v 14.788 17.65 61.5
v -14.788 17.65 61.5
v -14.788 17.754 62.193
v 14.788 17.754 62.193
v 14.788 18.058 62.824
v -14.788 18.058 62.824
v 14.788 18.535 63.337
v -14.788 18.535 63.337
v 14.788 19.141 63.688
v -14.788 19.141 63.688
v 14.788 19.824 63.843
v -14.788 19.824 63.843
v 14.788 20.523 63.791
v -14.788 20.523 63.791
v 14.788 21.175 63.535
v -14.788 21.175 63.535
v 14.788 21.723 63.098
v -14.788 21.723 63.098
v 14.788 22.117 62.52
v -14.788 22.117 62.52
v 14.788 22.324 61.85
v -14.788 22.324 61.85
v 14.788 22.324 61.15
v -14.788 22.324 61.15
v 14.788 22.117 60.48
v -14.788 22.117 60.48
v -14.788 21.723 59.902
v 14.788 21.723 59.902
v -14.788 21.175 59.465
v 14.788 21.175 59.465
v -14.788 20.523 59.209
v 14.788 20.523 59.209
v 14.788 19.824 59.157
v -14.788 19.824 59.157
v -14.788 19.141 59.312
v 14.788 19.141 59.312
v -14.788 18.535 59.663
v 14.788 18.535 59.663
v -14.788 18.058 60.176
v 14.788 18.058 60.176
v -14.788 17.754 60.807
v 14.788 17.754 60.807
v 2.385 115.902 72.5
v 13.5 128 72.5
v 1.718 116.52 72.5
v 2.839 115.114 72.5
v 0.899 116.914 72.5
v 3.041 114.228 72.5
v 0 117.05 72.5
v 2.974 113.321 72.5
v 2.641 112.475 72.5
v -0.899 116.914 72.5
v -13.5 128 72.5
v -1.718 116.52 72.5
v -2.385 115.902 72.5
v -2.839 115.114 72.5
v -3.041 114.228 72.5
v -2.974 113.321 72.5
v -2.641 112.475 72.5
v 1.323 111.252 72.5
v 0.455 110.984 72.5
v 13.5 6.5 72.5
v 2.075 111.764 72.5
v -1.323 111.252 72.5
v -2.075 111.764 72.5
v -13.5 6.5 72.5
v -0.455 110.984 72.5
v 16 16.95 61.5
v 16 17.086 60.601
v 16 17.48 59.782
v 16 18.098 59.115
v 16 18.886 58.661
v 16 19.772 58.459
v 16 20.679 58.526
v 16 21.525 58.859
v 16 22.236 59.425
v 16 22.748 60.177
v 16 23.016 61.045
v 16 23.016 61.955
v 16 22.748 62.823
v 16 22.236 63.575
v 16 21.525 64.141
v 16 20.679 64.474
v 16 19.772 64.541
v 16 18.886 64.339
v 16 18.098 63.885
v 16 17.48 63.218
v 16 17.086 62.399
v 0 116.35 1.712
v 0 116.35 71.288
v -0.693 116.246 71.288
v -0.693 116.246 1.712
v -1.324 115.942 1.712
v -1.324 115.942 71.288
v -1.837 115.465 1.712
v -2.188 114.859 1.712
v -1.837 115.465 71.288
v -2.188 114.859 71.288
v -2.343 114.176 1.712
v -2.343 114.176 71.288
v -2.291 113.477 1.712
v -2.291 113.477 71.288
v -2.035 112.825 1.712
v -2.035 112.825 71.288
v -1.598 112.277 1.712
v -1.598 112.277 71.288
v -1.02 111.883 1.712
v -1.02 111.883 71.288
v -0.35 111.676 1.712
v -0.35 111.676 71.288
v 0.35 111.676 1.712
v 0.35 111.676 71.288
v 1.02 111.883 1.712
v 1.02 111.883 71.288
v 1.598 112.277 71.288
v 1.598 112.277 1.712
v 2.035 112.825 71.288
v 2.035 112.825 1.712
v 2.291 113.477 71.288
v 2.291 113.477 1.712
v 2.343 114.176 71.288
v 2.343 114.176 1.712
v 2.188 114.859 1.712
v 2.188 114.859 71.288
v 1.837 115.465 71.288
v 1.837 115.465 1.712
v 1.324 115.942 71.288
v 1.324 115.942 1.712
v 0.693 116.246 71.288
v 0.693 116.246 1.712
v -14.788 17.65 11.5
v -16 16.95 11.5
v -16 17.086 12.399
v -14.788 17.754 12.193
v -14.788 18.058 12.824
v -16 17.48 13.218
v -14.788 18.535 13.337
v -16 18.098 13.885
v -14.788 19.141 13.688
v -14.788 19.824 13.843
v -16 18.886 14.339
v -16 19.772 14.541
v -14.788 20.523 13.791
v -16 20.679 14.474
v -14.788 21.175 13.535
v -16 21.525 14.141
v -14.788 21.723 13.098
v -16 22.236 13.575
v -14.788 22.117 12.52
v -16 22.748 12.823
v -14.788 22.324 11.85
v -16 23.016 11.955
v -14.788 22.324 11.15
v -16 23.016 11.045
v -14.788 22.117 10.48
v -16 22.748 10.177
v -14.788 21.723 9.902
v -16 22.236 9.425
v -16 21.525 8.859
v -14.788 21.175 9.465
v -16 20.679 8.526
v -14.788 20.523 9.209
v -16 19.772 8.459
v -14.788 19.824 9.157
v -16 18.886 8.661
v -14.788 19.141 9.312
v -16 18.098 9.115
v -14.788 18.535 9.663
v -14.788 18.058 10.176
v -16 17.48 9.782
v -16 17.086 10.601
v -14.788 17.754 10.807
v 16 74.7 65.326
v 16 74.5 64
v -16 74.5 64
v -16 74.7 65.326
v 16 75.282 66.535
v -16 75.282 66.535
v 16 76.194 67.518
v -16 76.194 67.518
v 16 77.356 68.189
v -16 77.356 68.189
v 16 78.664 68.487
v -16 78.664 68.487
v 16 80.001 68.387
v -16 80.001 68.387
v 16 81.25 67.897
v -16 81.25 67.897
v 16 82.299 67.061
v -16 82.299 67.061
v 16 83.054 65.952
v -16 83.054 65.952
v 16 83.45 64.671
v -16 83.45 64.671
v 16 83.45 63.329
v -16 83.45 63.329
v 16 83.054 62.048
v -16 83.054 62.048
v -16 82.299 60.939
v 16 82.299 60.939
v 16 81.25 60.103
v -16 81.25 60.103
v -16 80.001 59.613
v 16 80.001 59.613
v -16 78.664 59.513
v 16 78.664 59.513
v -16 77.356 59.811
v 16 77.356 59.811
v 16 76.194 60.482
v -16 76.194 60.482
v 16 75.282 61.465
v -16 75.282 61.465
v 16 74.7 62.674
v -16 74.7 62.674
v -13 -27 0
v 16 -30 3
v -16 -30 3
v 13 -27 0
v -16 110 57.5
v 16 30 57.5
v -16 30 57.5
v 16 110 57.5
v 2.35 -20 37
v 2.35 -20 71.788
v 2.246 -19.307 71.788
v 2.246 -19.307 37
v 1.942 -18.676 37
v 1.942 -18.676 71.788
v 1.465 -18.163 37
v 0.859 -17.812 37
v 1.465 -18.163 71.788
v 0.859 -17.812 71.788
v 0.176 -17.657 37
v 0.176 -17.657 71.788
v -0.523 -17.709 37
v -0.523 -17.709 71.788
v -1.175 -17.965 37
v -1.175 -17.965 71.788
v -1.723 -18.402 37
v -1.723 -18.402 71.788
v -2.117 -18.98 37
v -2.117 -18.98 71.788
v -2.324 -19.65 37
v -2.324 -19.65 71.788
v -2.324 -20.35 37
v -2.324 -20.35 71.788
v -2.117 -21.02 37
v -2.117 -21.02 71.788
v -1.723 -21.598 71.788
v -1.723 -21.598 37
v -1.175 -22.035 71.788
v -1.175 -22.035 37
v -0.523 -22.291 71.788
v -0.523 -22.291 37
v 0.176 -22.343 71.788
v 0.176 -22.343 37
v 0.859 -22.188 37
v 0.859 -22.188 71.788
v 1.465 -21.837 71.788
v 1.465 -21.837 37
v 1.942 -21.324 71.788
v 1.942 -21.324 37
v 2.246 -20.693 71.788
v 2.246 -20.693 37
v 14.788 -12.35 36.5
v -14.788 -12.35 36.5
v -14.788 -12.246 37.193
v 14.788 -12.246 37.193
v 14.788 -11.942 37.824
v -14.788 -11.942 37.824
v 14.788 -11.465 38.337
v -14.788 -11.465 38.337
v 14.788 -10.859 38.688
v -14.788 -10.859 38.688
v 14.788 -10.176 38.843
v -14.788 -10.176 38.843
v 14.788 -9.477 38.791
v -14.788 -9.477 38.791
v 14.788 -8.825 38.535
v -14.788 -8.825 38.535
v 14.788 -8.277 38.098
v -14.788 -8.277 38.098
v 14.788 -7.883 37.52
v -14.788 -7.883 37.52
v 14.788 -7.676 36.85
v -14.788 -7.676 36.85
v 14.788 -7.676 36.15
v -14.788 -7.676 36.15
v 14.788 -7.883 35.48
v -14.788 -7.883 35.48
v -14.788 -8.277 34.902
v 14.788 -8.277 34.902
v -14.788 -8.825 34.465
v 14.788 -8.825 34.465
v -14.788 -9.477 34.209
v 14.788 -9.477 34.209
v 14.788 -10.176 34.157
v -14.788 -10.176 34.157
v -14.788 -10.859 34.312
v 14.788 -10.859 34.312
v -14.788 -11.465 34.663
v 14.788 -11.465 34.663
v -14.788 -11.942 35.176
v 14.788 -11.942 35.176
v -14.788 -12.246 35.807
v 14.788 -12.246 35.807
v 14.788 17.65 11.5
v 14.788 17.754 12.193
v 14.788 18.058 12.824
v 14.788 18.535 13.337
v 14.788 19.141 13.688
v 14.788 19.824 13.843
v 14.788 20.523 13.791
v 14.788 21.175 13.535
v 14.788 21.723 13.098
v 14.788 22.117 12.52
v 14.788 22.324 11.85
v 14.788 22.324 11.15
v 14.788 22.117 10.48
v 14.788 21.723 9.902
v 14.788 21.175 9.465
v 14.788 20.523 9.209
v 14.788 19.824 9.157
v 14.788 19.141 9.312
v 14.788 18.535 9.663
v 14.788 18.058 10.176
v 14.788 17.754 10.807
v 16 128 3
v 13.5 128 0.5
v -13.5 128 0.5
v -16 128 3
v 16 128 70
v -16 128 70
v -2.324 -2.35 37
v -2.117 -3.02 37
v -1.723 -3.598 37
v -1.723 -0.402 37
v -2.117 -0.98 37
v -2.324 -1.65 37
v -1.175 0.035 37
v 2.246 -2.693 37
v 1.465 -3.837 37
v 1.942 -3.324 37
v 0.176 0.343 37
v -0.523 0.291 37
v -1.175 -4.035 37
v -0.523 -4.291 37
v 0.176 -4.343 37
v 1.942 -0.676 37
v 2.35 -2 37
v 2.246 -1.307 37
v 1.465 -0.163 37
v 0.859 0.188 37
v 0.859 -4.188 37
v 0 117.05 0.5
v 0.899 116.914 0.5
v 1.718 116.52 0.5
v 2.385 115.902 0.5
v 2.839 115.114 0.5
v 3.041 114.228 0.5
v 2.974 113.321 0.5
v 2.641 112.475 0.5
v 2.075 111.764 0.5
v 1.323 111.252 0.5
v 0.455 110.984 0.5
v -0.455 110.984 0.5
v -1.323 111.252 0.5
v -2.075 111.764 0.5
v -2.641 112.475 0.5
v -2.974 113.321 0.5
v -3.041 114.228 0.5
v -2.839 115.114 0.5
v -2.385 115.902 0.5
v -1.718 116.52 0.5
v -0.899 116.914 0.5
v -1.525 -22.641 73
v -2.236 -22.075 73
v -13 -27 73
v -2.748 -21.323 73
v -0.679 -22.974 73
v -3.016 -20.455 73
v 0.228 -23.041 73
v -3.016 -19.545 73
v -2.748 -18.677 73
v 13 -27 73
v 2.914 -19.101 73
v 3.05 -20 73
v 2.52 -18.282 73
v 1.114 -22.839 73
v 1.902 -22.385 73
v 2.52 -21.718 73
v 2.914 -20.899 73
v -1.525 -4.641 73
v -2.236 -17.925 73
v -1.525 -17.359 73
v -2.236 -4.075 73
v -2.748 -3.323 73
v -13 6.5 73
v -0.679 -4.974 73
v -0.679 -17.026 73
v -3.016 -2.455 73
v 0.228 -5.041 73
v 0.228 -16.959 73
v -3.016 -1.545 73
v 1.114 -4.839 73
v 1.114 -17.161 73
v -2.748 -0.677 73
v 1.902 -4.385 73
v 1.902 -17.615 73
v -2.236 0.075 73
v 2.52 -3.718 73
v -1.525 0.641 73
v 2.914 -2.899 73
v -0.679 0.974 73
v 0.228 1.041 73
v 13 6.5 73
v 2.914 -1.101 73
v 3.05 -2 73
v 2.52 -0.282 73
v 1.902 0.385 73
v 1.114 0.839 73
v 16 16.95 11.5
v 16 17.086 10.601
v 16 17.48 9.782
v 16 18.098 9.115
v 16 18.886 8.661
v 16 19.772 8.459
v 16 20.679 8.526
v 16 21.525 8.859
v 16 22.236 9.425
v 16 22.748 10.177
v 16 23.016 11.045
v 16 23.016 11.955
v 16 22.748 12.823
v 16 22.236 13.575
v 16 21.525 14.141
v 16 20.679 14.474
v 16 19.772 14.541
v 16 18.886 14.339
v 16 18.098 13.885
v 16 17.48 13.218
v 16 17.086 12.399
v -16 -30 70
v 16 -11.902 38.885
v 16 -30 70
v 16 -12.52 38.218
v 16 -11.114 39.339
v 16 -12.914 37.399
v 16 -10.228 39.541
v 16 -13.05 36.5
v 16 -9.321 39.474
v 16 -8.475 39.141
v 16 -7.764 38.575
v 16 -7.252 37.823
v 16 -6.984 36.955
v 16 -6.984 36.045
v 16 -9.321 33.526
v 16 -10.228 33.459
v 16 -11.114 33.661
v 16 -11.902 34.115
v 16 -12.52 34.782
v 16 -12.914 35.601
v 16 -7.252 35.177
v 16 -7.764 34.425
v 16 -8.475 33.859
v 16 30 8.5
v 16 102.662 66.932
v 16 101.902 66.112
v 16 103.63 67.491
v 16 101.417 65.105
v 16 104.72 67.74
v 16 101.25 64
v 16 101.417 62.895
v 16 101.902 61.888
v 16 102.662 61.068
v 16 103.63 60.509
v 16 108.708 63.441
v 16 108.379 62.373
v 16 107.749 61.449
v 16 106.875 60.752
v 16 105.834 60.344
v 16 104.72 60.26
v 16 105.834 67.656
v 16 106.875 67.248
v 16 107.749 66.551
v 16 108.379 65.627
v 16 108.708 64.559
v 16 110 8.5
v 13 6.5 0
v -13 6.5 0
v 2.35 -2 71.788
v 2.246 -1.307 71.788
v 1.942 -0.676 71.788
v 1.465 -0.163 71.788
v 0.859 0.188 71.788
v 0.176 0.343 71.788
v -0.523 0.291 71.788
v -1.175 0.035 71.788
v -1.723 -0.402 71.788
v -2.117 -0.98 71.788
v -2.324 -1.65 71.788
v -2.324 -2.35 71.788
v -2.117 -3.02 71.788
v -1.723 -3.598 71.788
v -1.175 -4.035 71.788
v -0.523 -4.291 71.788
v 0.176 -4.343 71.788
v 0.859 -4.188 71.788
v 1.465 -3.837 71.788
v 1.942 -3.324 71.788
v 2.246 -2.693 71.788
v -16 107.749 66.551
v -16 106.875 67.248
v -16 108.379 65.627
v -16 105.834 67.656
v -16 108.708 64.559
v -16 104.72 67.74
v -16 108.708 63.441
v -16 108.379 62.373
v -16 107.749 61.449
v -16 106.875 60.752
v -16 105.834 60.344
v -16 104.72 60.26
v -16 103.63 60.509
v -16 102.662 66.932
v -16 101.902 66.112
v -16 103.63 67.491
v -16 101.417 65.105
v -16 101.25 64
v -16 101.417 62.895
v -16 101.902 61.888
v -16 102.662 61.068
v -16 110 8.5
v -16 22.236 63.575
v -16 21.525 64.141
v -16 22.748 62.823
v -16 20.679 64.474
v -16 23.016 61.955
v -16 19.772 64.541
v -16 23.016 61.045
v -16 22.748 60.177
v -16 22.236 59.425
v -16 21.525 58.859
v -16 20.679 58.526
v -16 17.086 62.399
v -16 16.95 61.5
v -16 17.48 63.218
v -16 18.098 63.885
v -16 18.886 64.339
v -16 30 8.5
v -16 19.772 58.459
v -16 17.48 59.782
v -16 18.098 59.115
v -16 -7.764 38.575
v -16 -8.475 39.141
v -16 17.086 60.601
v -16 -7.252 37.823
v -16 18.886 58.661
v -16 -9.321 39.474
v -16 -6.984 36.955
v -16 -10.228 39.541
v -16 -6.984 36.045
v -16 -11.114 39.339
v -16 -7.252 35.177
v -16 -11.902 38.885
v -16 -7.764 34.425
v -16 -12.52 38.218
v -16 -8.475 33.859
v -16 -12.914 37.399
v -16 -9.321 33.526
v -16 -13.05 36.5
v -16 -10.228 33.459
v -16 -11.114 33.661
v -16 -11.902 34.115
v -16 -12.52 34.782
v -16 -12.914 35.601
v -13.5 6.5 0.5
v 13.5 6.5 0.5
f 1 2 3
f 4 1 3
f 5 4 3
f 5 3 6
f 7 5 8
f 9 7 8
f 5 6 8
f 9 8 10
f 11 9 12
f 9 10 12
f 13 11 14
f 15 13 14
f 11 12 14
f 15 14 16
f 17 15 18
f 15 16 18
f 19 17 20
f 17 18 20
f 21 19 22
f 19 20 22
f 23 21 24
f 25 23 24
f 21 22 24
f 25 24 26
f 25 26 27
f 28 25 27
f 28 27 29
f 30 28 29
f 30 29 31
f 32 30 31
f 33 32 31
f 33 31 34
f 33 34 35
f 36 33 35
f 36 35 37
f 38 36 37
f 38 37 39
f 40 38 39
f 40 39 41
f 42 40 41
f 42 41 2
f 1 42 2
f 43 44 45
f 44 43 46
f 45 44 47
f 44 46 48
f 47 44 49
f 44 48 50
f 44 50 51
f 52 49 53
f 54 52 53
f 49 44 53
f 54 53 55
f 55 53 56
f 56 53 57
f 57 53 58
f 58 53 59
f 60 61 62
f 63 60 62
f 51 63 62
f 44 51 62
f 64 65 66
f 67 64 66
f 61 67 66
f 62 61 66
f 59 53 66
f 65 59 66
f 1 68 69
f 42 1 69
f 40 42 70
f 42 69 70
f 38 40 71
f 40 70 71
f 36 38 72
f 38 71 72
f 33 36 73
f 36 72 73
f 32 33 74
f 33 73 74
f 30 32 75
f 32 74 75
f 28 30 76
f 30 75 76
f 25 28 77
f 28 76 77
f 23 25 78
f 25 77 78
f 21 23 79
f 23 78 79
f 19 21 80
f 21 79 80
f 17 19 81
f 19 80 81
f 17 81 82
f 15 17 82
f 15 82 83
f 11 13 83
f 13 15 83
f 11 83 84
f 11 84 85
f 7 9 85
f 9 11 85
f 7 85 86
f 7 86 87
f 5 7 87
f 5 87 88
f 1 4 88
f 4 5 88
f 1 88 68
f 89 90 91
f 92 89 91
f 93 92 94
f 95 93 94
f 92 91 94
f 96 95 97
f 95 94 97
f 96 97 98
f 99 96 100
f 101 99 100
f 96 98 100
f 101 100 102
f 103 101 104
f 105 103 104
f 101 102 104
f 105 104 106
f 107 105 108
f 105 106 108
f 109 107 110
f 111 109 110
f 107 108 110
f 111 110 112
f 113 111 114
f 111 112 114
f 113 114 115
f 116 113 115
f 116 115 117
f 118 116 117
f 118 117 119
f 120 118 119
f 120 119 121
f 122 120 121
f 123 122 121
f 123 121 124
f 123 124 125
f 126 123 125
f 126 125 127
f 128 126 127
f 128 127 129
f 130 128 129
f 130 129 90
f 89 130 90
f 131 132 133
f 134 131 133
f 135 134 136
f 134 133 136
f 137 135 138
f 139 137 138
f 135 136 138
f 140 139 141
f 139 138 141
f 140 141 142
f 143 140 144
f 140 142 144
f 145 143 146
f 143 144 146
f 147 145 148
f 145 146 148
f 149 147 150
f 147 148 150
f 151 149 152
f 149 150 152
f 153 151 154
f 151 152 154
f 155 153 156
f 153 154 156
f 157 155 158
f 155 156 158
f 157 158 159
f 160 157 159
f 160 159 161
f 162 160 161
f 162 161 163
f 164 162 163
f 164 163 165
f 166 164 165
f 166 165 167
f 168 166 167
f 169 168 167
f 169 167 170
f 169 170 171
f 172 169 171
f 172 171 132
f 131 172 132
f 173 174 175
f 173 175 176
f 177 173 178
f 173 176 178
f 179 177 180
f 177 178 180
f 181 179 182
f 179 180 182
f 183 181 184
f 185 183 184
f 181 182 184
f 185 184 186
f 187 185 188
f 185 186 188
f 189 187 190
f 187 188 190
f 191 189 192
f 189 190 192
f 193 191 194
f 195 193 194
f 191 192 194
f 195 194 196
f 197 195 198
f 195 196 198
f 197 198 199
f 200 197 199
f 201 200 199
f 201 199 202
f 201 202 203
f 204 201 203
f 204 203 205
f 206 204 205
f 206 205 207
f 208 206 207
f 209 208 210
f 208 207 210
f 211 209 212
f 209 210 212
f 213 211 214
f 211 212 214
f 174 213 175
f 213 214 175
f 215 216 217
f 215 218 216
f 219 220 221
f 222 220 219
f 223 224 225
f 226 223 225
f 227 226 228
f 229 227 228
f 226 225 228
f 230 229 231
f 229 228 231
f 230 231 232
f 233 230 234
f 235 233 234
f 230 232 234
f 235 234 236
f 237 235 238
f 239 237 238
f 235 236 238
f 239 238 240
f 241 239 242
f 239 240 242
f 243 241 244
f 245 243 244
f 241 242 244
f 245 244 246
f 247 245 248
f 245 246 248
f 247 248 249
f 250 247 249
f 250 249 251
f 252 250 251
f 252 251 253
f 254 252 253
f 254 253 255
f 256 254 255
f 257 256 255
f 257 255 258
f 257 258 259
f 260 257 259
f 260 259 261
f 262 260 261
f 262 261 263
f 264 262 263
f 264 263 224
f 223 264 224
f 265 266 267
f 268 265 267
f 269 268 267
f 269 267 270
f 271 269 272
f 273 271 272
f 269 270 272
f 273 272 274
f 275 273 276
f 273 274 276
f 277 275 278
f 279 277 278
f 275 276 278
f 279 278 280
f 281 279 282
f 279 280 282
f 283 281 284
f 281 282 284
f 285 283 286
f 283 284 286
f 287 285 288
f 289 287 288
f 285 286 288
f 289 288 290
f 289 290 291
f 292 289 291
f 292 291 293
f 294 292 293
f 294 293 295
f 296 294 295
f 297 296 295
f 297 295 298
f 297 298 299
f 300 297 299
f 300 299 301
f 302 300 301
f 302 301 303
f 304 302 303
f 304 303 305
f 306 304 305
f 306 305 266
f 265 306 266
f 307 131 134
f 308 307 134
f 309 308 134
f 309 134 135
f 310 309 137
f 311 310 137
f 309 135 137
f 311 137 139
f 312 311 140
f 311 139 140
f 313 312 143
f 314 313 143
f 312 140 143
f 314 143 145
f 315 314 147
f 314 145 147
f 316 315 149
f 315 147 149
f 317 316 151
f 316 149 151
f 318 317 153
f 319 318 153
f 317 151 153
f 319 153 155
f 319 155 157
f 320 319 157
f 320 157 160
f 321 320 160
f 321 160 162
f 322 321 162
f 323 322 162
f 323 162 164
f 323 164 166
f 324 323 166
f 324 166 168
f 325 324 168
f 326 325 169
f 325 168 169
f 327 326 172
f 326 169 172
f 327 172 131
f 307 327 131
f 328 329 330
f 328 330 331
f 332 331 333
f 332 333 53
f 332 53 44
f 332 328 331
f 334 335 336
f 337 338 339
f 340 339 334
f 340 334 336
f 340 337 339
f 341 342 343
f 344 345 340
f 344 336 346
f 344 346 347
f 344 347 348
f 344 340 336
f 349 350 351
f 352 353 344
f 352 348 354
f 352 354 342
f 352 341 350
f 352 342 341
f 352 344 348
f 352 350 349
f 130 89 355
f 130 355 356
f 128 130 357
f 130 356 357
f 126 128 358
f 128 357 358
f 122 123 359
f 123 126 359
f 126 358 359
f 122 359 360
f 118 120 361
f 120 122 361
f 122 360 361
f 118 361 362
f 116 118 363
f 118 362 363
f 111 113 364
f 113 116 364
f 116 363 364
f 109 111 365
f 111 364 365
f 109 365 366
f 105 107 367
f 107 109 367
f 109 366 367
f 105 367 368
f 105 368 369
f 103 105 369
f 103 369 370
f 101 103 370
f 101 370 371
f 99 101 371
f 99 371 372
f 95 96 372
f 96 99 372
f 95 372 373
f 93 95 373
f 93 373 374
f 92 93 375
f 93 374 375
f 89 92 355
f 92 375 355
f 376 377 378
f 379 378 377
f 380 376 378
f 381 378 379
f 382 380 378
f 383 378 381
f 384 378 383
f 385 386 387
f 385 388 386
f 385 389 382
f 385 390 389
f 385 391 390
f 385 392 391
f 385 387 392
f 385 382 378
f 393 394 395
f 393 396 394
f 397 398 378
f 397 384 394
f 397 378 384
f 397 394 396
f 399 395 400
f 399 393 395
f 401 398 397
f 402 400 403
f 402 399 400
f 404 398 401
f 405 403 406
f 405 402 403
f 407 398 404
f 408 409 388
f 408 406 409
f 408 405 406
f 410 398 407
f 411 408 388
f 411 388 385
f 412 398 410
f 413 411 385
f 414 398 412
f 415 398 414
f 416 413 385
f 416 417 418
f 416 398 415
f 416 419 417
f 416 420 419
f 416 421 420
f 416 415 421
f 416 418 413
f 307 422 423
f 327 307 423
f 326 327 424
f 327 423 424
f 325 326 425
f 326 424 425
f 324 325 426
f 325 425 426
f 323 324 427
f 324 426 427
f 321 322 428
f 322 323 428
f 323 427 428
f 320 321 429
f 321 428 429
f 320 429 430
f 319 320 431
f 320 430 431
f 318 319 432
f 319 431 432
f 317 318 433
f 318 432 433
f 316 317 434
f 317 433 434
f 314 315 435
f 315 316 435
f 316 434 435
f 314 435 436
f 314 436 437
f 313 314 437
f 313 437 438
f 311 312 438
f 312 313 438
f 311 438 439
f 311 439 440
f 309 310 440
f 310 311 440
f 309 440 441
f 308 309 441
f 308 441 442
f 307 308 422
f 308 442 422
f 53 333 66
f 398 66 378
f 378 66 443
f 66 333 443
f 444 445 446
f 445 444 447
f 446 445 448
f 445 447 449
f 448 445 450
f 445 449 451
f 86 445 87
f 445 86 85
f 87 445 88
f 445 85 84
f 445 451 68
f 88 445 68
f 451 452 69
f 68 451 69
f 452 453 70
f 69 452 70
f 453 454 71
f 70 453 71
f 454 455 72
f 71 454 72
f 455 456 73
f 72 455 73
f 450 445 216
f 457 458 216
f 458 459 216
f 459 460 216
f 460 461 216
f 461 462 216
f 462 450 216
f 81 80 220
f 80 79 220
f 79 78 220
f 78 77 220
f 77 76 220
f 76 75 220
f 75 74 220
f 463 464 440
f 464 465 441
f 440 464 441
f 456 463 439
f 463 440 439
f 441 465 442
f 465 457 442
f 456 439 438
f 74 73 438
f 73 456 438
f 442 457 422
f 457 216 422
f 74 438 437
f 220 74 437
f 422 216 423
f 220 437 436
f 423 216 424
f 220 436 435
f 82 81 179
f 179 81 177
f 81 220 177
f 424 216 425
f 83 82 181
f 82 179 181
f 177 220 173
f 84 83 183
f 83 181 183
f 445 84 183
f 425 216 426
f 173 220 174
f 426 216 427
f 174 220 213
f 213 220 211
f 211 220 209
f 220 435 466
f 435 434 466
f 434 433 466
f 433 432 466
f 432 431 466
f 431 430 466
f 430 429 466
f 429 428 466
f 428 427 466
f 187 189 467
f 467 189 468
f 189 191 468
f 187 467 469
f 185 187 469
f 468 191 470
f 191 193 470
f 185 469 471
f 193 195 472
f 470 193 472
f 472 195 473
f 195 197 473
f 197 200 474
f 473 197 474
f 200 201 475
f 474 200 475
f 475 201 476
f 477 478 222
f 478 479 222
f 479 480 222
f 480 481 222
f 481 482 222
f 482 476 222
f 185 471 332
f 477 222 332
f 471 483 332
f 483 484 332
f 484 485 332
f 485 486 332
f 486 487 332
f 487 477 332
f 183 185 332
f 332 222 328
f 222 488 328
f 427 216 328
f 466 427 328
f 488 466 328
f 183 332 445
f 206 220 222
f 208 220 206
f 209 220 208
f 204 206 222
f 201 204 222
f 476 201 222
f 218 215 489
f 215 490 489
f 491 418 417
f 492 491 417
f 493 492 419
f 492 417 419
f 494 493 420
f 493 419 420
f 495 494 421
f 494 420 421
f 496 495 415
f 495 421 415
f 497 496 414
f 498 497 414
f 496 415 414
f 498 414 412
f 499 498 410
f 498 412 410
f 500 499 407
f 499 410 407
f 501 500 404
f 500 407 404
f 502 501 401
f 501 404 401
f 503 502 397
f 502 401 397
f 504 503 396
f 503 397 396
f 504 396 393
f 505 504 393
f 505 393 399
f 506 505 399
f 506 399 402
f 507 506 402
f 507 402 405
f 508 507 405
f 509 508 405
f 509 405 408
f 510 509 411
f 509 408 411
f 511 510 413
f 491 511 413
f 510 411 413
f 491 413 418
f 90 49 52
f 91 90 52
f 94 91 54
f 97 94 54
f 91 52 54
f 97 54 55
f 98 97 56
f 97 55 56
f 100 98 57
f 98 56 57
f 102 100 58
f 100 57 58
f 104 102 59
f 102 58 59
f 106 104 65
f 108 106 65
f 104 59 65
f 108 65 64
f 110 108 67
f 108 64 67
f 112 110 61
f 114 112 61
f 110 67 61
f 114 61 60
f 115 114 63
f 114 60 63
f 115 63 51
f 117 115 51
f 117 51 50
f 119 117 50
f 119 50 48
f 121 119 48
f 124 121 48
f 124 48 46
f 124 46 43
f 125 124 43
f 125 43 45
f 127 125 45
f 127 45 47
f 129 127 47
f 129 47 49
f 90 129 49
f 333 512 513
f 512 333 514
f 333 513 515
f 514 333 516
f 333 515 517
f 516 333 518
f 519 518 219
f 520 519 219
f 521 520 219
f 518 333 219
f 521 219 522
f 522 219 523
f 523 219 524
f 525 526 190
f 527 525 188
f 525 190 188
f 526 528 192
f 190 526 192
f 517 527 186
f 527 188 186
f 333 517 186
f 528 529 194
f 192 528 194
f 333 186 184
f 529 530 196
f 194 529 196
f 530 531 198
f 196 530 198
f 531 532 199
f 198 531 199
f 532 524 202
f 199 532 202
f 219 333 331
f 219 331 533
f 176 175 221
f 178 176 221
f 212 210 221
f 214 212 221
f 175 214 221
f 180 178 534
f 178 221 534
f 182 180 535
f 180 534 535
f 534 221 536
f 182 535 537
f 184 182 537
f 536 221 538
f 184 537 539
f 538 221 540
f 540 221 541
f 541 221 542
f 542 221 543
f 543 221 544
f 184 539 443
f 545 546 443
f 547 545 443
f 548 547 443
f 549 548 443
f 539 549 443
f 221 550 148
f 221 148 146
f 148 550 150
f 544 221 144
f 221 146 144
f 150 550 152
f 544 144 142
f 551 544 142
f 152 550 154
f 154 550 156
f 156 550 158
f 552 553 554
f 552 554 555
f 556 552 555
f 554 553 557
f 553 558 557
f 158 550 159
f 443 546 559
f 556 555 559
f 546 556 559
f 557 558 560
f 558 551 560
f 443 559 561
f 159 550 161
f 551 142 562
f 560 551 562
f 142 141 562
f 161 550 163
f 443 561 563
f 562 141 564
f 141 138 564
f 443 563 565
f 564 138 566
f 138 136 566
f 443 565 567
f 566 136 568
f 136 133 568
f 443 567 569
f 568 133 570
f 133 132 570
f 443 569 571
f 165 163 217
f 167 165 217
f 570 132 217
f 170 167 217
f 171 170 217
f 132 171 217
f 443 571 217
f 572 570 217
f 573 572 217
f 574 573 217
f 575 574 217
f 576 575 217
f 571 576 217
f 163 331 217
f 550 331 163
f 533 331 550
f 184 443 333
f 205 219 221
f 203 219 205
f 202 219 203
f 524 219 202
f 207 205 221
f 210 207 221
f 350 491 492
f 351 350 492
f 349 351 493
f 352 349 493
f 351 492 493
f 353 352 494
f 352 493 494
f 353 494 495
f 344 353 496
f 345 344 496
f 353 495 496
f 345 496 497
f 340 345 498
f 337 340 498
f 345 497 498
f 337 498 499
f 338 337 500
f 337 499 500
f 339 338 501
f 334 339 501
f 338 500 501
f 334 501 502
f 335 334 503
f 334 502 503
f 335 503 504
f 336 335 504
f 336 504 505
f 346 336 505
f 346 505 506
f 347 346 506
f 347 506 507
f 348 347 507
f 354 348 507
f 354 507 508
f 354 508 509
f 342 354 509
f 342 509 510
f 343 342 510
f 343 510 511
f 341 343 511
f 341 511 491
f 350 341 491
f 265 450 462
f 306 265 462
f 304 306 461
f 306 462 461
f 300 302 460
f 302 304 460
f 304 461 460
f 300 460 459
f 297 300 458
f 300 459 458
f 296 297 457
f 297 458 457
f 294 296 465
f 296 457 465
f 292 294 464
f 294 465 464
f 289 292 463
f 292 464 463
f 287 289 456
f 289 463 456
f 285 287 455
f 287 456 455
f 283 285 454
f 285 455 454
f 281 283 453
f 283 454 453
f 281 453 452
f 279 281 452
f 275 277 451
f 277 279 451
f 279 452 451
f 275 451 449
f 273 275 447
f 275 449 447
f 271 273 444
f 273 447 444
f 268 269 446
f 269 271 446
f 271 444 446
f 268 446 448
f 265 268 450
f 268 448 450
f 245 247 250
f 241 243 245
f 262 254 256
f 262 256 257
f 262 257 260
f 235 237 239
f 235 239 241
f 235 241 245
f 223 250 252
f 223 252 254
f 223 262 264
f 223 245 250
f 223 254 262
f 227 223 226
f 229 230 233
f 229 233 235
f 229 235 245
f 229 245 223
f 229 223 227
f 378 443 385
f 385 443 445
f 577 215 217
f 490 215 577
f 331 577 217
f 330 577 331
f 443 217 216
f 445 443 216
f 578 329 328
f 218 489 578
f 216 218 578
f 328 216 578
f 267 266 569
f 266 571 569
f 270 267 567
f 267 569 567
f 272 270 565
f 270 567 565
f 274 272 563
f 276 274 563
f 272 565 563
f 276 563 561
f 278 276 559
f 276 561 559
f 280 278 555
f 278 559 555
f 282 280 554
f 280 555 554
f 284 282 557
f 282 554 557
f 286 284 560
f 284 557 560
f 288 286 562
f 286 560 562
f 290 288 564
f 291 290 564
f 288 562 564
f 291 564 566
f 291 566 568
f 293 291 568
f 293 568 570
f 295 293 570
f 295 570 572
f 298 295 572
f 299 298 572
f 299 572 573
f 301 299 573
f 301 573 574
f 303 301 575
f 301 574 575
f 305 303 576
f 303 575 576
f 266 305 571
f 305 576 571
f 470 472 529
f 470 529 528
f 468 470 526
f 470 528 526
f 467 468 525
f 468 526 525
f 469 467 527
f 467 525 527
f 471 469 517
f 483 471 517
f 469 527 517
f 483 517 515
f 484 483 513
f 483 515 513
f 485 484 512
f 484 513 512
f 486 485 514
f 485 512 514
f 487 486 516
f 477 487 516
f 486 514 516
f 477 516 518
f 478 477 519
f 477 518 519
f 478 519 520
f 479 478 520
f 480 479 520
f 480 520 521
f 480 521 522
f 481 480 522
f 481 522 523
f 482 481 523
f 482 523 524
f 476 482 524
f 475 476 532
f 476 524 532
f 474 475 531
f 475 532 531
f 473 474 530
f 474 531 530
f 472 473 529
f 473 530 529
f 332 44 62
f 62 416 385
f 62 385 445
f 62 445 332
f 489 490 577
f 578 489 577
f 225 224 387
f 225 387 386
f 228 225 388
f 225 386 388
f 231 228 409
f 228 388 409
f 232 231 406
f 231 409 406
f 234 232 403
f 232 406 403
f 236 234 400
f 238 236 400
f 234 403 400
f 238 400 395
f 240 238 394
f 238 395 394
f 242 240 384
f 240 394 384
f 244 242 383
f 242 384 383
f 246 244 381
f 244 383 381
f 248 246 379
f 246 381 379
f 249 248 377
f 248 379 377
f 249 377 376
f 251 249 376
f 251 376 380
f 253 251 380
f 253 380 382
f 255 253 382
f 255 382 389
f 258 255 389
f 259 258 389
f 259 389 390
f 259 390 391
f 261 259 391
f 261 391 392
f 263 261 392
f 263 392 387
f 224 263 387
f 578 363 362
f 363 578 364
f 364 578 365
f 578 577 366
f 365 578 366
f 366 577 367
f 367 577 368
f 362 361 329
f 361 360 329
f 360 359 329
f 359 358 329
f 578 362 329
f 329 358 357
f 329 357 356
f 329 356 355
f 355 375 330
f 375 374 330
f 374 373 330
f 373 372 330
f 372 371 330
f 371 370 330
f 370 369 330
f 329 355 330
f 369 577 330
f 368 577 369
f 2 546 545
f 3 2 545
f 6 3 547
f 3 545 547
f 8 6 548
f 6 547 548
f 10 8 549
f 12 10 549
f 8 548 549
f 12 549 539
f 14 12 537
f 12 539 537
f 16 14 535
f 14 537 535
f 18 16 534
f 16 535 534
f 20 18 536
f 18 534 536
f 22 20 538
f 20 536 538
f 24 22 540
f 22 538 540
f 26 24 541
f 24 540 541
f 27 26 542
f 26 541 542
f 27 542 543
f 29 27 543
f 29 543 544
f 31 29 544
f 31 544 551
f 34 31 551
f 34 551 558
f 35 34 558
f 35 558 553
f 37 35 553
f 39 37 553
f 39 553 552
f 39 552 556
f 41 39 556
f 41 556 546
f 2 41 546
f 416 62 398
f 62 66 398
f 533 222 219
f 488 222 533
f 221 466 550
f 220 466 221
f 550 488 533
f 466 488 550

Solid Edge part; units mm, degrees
sketch "Sketch1" plane through (0, 0, 0) normal (0, 0, 1) x (1, 0, 0)
  line L0 (-16, -30) -> (16, -30)
  line L1 (16, -30) -> (16, 30)
  line L2 (16, 30) -> (-16, 30)
  line L3 (-16, 30) -> (-16, -30)
  dimension "D1" = 32
  dimension "D2" = 60
extrude "Protrusion1" add sketch "Sketch1" along normal blind 73
sketch "Sketch2" plane through (0, 0, 73) normal (0, 0, 1) x (1, 0, 0)
  circle A0 centre (0, -20) radius 2.35
  circle A1 centre (0, -2) radius 2.35
  dimension "D1" = 4.7
  dimension "D2" = 18
  dimension "D3" = 10
extrude "Extrusionsausschnitt_1" cut sketch "Sketch2" against normal blind 36
chamfer "Fase_3" distance 0.7 angle 60 2 edges at (-2.35, -2, 73) (-2.35, -20, 73) measured on face at (-10.9867, -19.4, 73)
chamfer "Fase_6" distance 3 angle 45 4 edges at (-16, 0, 73) (-16, 0, 0) (16, 0, 73) (16, 0, 0)
chamfer "Fase_7" distance 3 angle 45 2 edges at (0, -30, 73) (0, -30, 0)
sketch "Sketch3" plane through (-16, 0, 36.5) normal (-1, 0, 0) x (0, -1, 0)
  circle A0 centre (-20, 25) radius 2.35
  circle A1 centre (-20, -25) radius 2.35
  circle A2 centre (10, 0) radius 2.35
  dimension "D1" = 4.7
  dimension "D2" = 50
  dimension "D3" = 10
  dimension "D4" = 30
extrude "Cutout1" cut sketch "Sketch3" against normal through all
chamfer "Fase_9" distance 0.7 angle 60 6 edges at (-16, 22.35, 61.5) (-16, -7.65, 36.5) (-16, 22.35, 11.5) (16, 20, 59.15) (16, 20, 9.15) (16, -10, 34.15) measured on face at (-16, 20.6, 58.1633) measured on face at (16, -20.6, 58.1633)
sketch "Sketch4" plane through (-16, 0, 36.5) normal (-1, 0, 0) x (0, -1, 0)
  line L0 (-6.5, 36.5) -> (-30, 36.5)
  line L1 (-30, 36.5) -> (-30, 36)
  line L2 (-30, 36) -> (-6.5, 36)
  line L3 (-6.5, 36) -> (-6.5, 36.5)
  line L4 (-30, -36.5) -> (-6.5, -36.5)
  line L5 (-6.5, -36.5) -> (-6.5, -36)
  line L6 (-6.5, -36) -> (-30, -36)
  line L7 (-30, -36) -> (-30, -36.5)
  dimension "D1" = 0.5
  dimension "D2" = 36.5
  dimension "D3" = 0.5
  dimension "D4" = 36.5
extrude "Cutout2" cut sketch "Sketch4" against normal through all
sketch "Sketch5" plane through (0, 30, 36.5) normal (0, 1, 0) x (1, 0, 0)
  line L0 (-16, 33.5) -> (-13.5, 36)
  line L1 (-13.5, 36) -> (13.5, 36)
  line L2 (13.5, 36) -> (16, 33.5)
  line L3 (16, 33.5) -> (16, -33.5)
  line L4 (16, -33.5) -> (13.5, -36)
  line L5 (13.5, -36) -> (-13.5, -36)
  line L6 (-13.5, -36) -> (-16, -33.5)
  line L7 (-16, -33.5) -> (-16, 33.5)
extrude "Extrusionsausprägung_2" add sketch "Sketch5" along normal blind 26
sketch "Sketch6" plane through (0, 56, 36.5) normal (0, 1, 0) x (-1, 0, 0)
  line L0 (-13.5, 36) -> (-16, 33.5)
  line L1 (-16, 33.5) -> (-16, -33.5)
  line L2 (-16, -33.5) -> (-13.5, -36)
  line L3 (-13.5, -36) -> (13.5, -36)
  line L4 (13.5, -36) -> (16, -33.5)
  line L5 (16, -33.5) -> (16, 33.5)
  line L6 (16, 33.5) -> (13.5, 36)
  line L7 (13.5, 36) -> (-13.5, 36)
extrude "Extrusionsausprägung_3" add sketch "Sketch6" along normal blind 72
sketch "Sketch7" plane through (16, 47, 36.5) normal (1, 0, 0) x (0, 1, 0)
  line L0 (-17, 21) -> (63, 21)
  line L1 (63, 21) -> (63, -28)
  line L2 (63, -28) -> (-17, -28)
  line L3 (-17, -28) -> (-17, 21)
  dimension "D1" = 10
  dimension "D2" = 80
  dimension "D3" = 15
  dimension "D4" = 8
extrude "Cutout3" cut sketch "Sketch7" against normal through all
sketch "Sketch8" plane through (0, 65.25, 72.5) normal (0, 0, 1) x (0, 1, 0)
  circle A0 centre (48.75, 0) radius 2.35
  dimension "D1" = 4.7
  dimension "D2" = 14
extrude "Cutout4" cut sketch "Sketch8" against normal through all
chamfer "Fase_11" distance 0.7 angle 60 2 edges at (-2.35, 114, 0.5) (0, 111.65, 72.5) measured on face at (8.73, 108.965, 72.5) measured on face at (8.73, 25.535, 0.5)
sketch "Sketch9" plane through (-16, 49, 36.5) normal (-1, 0, 0) x (0, -1, 0)
  circle A0 centre (-56, 27.5) radius 3.75
  dimension "D1" = 9
  dimension "D2" = 7.5
  dimension "D3" = 8.5
extrude "Cutout5" cut sketch "Sketch9" against normal through all
sketch "Sketch10" plane through (-16, 49, 36.5) normal (-1, 0, 0) x (0, -1, 0)
  circle A0 centre (-30, 27.5) radius 4.5
  dimension "D1" = 9
  dimension "D2" = 26
extrude "Cutout6" cut sketch "Sketch10" against normal through all
properties material "Nylon, allgemein"
